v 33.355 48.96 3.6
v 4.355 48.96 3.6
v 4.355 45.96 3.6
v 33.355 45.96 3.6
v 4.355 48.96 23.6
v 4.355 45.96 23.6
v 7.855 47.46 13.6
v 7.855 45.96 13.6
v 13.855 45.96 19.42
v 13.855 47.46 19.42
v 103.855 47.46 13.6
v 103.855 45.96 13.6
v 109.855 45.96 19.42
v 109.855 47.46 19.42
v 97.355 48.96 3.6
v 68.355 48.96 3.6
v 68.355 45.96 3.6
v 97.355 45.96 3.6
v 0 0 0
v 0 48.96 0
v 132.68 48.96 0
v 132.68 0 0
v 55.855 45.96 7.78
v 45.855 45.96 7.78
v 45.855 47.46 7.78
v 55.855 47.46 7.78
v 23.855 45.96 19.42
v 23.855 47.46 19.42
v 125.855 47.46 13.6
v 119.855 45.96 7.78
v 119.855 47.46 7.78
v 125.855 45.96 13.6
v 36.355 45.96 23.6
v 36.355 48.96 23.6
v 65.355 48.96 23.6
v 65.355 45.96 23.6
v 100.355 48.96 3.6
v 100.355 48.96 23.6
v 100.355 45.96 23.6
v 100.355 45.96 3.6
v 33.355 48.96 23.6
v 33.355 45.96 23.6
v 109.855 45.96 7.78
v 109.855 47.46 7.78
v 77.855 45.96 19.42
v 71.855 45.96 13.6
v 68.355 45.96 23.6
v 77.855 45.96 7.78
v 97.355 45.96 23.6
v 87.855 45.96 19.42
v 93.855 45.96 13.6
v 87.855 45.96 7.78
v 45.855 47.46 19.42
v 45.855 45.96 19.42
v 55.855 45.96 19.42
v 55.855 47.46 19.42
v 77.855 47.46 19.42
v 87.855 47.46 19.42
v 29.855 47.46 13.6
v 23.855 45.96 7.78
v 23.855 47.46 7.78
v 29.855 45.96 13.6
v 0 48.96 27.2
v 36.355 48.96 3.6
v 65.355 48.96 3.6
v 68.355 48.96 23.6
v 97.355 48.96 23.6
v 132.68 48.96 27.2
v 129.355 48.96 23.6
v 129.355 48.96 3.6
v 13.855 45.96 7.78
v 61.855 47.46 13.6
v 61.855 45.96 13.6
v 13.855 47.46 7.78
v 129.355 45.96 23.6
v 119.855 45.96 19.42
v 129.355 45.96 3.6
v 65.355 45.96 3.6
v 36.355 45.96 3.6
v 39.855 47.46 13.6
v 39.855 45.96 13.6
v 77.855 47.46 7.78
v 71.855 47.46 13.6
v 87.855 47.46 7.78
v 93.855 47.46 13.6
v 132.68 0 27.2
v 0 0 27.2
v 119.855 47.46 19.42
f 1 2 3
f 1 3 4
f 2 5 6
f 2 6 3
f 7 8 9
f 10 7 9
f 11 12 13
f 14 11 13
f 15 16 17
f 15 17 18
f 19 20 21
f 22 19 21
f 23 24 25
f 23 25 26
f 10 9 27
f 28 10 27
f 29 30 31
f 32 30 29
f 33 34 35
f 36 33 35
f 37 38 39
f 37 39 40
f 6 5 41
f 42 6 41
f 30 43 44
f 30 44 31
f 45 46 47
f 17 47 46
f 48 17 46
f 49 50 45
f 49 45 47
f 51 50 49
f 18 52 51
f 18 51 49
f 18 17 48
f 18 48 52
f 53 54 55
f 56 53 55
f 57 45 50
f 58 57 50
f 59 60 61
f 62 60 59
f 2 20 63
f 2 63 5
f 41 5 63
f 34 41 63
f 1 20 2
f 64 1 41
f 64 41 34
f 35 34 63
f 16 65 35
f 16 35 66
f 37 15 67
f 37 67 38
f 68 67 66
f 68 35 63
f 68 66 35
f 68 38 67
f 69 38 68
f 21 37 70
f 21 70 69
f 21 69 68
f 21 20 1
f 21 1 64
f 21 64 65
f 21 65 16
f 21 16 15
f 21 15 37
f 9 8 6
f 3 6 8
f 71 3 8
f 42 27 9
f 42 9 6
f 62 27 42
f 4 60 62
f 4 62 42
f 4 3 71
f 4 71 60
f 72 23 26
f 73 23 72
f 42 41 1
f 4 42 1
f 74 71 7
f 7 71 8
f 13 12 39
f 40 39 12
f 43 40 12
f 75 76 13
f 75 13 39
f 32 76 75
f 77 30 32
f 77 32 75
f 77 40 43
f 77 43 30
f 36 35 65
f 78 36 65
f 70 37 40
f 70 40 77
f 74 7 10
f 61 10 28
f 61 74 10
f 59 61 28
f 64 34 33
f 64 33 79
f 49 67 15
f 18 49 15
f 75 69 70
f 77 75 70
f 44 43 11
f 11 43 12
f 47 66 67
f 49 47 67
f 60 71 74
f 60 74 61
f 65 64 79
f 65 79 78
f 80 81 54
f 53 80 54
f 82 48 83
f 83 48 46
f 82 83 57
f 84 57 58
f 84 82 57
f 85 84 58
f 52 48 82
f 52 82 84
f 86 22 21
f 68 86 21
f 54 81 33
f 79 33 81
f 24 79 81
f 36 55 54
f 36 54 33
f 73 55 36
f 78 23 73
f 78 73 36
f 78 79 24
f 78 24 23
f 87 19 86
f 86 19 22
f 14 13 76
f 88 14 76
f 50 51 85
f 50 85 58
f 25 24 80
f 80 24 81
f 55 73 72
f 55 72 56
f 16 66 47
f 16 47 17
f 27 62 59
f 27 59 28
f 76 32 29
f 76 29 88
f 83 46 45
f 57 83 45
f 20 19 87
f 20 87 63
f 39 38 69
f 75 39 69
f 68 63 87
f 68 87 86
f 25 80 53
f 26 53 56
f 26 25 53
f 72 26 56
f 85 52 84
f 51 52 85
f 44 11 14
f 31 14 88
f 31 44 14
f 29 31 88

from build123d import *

# Parameters (mm, degrees)
SKETCH2_W           = 132.68
SKETCH2_H           = 48.96
BOSS_EXTRUDE1_DEPTH = 27.2
SKETCH3_W           = 29
SKETCH3_H           = 20
CUT_EXTRUDE1_DEPTH  = 3
SKETCH4_W           = 10
SKETCH4_H           = 11.64
BOSS_EXTRUDE2_DEPTH = 1.5
LPATTERN1_COUNT     = 4
LPATTERN1_PITCH     = 32


with BuildPart() as part:
    # Sketch2 → Boss-Extrude1 (new body)
    with BuildSketch(Plane.XY):
        with Locations((66.34, 24.48)):
            Rectangle(SKETCH2_W, SKETCH2_H)
    extrude(amount=BOSS_EXTRUDE1_DEPTH)

    # Sketch3 → Cut-Extrude1 (cut)
    with BuildSketch(Plane(origin=(0, 48.96, 0), x_dir=(1, 0, 0), z_dir=(0, 1, 0))):
        with Locations((18.855, -13.6)):
            Rectangle(SKETCH3_W, SKETCH3_H)
    cut_extrude1 = extrude(amount=-CUT_EXTRUDE1_DEPTH, mode=Mode.SUBTRACT)

    # Sketch4 → Boss-Extrude2 (add)
    with BuildSketch(Plane(origin=(0, 45.96, 0), x_dir=(1, 0, 0), z_dir=(0, 1, 0))):
        Polygon((13.855, -7.78), (7.855, -13.6), (13.855, -19.42), align=None)
        with Locations((18.855, -13.6)):
            Rectangle(SKETCH4_W, SKETCH4_H)
        Polygon((29.855, -13.6), (23.855, -19.42), (23.855, -7.78), align=None)
    boss_extrude2 = extrude(amount=BOSS_EXTRUDE2_DEPTH)

    # LPattern1: Cut-Extrude1, Boss-Extrude2 ×4
    with Locations(*[(i * LPATTERN1_PITCH, 0, 0) for i in range(1, LPATTERN1_COUNT)]):
        add(cut_extrude1, mode=Mode.SUBTRACT)
        add(boss_extrude2)


solid = part.part
